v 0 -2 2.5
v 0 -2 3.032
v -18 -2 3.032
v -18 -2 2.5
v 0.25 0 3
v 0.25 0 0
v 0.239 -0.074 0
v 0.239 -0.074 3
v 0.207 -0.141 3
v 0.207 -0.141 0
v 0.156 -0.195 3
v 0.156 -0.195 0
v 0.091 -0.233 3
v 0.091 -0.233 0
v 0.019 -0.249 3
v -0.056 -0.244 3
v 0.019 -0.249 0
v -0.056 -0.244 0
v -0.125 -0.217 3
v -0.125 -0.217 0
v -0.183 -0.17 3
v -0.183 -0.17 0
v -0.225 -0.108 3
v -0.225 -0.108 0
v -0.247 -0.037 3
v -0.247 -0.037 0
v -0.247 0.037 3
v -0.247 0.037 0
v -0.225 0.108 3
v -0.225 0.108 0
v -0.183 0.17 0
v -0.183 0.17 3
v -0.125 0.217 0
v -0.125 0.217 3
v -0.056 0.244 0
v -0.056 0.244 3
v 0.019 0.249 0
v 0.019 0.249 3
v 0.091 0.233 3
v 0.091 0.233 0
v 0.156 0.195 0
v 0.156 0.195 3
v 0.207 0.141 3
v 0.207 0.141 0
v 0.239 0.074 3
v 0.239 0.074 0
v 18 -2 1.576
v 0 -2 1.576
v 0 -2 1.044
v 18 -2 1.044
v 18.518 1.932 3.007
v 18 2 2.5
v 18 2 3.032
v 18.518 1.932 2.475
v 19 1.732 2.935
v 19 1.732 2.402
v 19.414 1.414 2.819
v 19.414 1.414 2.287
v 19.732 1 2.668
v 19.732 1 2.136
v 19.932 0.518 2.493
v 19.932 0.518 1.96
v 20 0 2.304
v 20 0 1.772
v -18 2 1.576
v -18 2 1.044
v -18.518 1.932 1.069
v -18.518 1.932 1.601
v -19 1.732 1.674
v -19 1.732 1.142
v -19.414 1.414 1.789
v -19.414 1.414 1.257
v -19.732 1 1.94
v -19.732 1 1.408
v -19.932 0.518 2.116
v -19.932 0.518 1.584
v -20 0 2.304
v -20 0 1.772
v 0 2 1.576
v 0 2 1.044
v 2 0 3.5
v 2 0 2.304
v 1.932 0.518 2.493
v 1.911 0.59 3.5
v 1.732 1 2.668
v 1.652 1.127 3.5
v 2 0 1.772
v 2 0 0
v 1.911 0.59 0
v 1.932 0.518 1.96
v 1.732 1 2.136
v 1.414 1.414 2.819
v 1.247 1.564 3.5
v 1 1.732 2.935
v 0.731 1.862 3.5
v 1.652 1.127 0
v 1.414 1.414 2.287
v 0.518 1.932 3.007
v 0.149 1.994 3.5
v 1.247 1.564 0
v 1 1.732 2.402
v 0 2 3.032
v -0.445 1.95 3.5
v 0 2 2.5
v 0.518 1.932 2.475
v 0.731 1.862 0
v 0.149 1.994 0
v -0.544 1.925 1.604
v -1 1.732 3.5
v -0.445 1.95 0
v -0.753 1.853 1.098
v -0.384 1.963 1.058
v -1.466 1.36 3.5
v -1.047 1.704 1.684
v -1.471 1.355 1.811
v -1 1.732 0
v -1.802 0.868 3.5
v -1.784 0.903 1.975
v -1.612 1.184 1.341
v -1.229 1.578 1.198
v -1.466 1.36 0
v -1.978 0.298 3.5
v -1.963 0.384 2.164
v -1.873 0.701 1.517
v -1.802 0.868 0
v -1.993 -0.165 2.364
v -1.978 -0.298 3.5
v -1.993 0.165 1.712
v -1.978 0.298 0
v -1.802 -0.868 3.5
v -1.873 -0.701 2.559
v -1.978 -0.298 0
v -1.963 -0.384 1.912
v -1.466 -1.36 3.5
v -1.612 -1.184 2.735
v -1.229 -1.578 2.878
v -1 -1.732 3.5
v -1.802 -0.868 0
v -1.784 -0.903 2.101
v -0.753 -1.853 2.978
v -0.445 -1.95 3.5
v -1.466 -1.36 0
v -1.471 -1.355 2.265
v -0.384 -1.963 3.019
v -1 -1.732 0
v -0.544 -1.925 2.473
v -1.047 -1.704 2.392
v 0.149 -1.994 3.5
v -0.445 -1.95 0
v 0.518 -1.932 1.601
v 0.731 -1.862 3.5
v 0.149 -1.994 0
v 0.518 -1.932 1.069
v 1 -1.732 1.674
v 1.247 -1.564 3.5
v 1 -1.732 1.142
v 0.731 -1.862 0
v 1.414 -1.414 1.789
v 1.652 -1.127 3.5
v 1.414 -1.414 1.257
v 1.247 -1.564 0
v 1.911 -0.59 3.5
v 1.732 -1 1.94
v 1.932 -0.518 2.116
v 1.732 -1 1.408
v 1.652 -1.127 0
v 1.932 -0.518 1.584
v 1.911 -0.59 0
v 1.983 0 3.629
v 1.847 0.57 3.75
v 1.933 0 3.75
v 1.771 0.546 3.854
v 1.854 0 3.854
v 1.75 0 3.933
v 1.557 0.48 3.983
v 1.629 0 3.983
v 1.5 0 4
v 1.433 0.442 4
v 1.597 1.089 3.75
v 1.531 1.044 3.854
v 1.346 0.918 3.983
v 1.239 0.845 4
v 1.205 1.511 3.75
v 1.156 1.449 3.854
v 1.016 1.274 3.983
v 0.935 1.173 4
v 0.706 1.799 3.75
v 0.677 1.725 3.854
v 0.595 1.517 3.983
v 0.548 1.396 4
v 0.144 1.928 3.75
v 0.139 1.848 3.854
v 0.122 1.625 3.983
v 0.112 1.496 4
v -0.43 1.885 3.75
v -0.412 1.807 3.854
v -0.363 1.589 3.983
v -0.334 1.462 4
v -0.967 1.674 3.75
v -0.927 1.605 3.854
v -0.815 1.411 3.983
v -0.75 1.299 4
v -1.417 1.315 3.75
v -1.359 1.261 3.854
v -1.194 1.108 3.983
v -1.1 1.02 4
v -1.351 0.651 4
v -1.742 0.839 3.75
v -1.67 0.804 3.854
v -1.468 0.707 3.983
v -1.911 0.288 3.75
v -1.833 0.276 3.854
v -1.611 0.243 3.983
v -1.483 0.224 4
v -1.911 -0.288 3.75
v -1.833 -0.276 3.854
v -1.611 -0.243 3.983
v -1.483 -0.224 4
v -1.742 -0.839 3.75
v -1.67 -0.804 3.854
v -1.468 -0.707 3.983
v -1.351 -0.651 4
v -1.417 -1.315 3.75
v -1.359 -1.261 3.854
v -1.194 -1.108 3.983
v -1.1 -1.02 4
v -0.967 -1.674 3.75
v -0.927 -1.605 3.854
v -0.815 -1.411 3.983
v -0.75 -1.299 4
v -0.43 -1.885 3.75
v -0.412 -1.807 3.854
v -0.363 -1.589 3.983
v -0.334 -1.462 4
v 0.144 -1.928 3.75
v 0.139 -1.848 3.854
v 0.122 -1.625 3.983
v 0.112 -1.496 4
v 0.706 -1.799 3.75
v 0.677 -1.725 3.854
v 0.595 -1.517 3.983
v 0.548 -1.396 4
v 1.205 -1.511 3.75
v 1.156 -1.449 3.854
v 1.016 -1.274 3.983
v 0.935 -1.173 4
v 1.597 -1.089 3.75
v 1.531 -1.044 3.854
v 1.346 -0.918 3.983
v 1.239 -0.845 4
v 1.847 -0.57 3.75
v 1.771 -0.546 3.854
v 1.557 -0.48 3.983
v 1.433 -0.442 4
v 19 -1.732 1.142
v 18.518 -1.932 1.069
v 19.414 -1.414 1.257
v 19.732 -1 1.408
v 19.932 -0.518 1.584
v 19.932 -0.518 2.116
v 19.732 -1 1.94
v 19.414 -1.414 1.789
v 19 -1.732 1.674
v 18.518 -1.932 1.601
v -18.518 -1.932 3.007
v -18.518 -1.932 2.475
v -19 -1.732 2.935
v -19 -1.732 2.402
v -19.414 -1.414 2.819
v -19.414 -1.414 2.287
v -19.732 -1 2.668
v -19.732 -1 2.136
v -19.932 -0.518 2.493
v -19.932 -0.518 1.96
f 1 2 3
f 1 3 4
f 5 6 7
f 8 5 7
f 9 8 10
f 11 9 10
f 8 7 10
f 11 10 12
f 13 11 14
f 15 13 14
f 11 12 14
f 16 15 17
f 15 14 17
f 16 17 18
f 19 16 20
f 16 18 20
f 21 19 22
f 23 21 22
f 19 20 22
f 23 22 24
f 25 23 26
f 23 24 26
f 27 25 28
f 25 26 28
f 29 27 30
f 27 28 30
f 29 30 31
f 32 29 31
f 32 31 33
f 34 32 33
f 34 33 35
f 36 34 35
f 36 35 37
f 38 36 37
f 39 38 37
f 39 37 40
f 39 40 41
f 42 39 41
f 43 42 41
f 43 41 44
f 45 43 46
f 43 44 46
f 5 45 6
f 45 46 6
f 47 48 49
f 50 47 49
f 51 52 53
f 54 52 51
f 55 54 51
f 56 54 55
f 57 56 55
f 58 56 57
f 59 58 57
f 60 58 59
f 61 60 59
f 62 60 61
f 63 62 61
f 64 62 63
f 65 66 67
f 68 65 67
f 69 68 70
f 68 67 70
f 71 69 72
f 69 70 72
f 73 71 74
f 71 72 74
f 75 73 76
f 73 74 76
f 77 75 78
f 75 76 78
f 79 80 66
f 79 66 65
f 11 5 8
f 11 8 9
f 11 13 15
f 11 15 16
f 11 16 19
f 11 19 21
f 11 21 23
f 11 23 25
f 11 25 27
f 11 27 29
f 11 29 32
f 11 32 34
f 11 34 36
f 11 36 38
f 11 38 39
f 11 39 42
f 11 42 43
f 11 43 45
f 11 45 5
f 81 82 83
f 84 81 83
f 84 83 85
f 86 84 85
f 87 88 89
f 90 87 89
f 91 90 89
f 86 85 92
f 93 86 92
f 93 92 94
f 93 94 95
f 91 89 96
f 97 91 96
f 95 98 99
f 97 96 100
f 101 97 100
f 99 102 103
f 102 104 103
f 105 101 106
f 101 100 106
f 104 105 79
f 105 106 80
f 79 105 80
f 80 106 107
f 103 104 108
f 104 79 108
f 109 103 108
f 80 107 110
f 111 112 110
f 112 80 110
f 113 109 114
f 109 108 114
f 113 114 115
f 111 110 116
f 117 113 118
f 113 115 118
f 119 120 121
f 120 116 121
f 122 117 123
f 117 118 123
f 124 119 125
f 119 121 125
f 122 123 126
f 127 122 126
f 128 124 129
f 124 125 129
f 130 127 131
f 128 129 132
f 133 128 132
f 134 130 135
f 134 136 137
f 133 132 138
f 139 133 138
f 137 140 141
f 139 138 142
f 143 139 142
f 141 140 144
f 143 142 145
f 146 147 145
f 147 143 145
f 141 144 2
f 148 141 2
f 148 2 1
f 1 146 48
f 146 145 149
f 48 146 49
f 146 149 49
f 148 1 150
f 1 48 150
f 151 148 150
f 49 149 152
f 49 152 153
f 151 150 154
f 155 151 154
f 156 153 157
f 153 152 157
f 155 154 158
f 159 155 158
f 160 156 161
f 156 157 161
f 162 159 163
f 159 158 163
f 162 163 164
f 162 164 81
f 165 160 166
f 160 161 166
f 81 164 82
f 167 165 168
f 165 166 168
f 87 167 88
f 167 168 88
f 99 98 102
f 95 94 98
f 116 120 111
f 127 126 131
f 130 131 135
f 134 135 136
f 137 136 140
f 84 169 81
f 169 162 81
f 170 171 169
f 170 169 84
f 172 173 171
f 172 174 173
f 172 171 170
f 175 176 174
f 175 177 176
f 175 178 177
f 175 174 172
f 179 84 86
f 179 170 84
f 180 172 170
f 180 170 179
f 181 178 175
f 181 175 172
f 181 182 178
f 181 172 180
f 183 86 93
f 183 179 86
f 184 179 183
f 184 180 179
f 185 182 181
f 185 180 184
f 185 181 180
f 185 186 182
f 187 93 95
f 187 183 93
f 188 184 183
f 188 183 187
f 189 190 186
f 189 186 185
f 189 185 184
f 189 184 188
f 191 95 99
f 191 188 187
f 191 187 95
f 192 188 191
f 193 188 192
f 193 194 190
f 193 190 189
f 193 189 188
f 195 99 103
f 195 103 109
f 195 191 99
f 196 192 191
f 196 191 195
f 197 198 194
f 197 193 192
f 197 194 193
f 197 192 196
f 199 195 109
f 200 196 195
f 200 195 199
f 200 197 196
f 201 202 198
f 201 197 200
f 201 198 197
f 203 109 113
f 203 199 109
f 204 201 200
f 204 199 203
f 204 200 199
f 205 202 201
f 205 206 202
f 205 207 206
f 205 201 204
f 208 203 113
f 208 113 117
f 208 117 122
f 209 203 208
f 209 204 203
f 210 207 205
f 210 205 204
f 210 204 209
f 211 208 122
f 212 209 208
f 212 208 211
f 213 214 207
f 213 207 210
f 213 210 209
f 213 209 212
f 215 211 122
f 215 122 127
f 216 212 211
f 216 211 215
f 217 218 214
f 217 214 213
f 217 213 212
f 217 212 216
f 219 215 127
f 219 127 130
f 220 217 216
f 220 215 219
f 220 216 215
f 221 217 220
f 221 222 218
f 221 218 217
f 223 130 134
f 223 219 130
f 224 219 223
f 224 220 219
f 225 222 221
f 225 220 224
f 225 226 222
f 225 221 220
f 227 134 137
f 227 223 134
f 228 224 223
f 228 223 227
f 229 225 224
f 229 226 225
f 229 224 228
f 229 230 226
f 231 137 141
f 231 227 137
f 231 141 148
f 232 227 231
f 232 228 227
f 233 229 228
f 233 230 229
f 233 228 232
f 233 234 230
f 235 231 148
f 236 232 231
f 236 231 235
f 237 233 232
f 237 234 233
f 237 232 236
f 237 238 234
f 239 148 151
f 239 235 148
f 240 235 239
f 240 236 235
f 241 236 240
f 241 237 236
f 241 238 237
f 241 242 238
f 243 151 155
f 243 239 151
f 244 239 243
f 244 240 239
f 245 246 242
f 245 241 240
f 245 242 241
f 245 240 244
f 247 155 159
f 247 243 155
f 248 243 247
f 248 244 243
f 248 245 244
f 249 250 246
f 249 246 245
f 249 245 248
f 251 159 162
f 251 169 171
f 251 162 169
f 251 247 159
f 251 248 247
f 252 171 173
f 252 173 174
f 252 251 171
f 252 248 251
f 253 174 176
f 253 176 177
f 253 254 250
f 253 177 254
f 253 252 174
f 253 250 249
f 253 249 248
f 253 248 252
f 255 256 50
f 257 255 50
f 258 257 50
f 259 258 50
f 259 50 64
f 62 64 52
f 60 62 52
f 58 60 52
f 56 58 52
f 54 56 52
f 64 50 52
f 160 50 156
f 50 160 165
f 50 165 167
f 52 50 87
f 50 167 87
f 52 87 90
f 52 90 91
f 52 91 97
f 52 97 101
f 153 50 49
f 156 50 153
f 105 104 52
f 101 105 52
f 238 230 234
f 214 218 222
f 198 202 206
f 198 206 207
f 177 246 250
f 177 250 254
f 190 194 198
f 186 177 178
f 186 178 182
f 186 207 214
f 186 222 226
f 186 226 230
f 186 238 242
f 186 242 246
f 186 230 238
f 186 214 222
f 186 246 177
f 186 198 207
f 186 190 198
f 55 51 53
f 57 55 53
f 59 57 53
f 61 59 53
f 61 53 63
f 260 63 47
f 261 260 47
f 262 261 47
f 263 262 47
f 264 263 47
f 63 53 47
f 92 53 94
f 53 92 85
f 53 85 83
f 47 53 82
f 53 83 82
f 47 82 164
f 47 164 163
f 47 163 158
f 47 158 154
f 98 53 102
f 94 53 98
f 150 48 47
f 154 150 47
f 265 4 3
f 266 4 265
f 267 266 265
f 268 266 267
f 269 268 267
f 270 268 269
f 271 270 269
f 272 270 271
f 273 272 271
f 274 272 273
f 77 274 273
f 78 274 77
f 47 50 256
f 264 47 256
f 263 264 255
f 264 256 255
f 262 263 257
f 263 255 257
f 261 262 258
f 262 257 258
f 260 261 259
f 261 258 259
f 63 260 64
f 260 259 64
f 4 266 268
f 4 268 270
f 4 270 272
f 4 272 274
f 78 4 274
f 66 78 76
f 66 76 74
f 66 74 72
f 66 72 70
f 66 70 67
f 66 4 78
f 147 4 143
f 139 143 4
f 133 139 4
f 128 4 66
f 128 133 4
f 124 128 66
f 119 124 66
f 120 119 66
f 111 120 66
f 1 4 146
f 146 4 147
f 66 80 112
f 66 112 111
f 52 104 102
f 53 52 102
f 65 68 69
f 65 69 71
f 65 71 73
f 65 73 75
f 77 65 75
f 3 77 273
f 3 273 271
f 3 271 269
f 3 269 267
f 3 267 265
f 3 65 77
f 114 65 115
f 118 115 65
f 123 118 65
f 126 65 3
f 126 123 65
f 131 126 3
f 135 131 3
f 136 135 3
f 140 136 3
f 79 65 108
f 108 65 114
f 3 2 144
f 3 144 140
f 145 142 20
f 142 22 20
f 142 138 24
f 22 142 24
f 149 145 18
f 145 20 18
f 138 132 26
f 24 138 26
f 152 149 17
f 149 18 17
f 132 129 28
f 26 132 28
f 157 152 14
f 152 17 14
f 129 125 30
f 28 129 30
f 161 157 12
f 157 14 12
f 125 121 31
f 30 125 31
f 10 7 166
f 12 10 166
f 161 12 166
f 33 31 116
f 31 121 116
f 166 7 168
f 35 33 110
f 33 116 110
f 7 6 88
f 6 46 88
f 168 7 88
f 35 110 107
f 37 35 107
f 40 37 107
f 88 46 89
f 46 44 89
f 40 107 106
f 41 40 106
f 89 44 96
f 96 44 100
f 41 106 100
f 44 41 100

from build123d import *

# Parameters (mm, degrees)
F0_R        = 2
F1_DEPTH    = 4
F3_DEPTH    = 20
F5_DEPTH    = 20
F6_T1_DEPTH = 10.5320888862
F6_T3_DEPTH = 10.5320888862
F7_R        = 0.5
F8_R        = 0.25
F9_DEPTH    = 3


# Not quite as in the source:
# - a fillet or chamfer that OpenCascade refuses, or shapes differently, is made with other operations: its cross-section is extruded or revolved along the edge and cut away or added


with BuildPart() as f1:
    # F0 (on Top) → F1 (new body)
    with BuildSketch(Plane.XY):
        Circle(F0_R)
    extrude(amount=F1_DEPTH)

    # F2 (on Right) → F3 (join)
    with BuildSketch(Plane.YZ):
        Polygon((2, 3.0320888862), (-2, 1.5762079492), (-2, 1.0441190629), (2, 2.5), align=None)
    extrude(amount=F3_DEPTH)

    # F4 (on Right) → F5 (join)
    with BuildSketch(Plane.YZ):
        Polygon((2, 1.0441190629), (2, 1.5762079492), (-2, 3.0320888862), (-2, 2.5), align=None)
    extrude(amount=-F5_DEPTH)

    # F6: fillet of radius 2 on 4 edges, made by hand

    # F6_s2 → F6_t1 (cut)
    with BuildSketch(Plane.XY.offset(-3.9558809371)):
        with BuildLine():
            ThreePointArc((-18, 2), (-19.4142135624, 1.4142135624), (-20, 0))
            Line((-20, 0), (-20, 2))
            Line((-20, 2), (-18, 2))
        make_face()
        with BuildLine():
            ThreePointArc((18, -2), (19.4142135624, -1.4142135624), (20, 0))
            Line((20, 0), (20, -2))
            Line((20, -2), (18, -2))
        make_face()
    extrude(amount=F6_T1_DEPTH, mode=Mode.SUBTRACT)

    # F6_s4 → F6_t3 (cut)
    with BuildSketch(Plane.XY.offset(-2.5)):
        with BuildLine():
            ThreePointArc((-18, -2), (-19.4142135624, -1.4142135624), (-20, 0))
            Line((-20, 0), (-20, -2))
            Line((-20, -2), (-18, -2))
        make_face()
        with BuildLine():
            ThreePointArc((18, 2), (19.4142135624, 1.4142135624), (20, 0))
            Line((20, 0), (20, 2))
            Line((20, 2), (18, 2))
        make_face()
    extrude(amount=F6_T3_DEPTH, mode=Mode.SUBTRACT)

    # F7
    f7_edges = [f1.edges().sort_by_distance(p)[0] for p in [
        (-2, 0, 4),
    ]]
    fillet(f7_edges, radius=F7_R)

    # F8 (on face) → F9 (cut)
    with BuildSketch(Plane(origin=(0, 0, 0), x_dir=(1, 0, 0), z_dir=(0, 0, -1))):
        Circle(F8_R)
    extrude(amount=-F9_DEPTH, mode=Mode.SUBTRACT)


solid = f1.part
